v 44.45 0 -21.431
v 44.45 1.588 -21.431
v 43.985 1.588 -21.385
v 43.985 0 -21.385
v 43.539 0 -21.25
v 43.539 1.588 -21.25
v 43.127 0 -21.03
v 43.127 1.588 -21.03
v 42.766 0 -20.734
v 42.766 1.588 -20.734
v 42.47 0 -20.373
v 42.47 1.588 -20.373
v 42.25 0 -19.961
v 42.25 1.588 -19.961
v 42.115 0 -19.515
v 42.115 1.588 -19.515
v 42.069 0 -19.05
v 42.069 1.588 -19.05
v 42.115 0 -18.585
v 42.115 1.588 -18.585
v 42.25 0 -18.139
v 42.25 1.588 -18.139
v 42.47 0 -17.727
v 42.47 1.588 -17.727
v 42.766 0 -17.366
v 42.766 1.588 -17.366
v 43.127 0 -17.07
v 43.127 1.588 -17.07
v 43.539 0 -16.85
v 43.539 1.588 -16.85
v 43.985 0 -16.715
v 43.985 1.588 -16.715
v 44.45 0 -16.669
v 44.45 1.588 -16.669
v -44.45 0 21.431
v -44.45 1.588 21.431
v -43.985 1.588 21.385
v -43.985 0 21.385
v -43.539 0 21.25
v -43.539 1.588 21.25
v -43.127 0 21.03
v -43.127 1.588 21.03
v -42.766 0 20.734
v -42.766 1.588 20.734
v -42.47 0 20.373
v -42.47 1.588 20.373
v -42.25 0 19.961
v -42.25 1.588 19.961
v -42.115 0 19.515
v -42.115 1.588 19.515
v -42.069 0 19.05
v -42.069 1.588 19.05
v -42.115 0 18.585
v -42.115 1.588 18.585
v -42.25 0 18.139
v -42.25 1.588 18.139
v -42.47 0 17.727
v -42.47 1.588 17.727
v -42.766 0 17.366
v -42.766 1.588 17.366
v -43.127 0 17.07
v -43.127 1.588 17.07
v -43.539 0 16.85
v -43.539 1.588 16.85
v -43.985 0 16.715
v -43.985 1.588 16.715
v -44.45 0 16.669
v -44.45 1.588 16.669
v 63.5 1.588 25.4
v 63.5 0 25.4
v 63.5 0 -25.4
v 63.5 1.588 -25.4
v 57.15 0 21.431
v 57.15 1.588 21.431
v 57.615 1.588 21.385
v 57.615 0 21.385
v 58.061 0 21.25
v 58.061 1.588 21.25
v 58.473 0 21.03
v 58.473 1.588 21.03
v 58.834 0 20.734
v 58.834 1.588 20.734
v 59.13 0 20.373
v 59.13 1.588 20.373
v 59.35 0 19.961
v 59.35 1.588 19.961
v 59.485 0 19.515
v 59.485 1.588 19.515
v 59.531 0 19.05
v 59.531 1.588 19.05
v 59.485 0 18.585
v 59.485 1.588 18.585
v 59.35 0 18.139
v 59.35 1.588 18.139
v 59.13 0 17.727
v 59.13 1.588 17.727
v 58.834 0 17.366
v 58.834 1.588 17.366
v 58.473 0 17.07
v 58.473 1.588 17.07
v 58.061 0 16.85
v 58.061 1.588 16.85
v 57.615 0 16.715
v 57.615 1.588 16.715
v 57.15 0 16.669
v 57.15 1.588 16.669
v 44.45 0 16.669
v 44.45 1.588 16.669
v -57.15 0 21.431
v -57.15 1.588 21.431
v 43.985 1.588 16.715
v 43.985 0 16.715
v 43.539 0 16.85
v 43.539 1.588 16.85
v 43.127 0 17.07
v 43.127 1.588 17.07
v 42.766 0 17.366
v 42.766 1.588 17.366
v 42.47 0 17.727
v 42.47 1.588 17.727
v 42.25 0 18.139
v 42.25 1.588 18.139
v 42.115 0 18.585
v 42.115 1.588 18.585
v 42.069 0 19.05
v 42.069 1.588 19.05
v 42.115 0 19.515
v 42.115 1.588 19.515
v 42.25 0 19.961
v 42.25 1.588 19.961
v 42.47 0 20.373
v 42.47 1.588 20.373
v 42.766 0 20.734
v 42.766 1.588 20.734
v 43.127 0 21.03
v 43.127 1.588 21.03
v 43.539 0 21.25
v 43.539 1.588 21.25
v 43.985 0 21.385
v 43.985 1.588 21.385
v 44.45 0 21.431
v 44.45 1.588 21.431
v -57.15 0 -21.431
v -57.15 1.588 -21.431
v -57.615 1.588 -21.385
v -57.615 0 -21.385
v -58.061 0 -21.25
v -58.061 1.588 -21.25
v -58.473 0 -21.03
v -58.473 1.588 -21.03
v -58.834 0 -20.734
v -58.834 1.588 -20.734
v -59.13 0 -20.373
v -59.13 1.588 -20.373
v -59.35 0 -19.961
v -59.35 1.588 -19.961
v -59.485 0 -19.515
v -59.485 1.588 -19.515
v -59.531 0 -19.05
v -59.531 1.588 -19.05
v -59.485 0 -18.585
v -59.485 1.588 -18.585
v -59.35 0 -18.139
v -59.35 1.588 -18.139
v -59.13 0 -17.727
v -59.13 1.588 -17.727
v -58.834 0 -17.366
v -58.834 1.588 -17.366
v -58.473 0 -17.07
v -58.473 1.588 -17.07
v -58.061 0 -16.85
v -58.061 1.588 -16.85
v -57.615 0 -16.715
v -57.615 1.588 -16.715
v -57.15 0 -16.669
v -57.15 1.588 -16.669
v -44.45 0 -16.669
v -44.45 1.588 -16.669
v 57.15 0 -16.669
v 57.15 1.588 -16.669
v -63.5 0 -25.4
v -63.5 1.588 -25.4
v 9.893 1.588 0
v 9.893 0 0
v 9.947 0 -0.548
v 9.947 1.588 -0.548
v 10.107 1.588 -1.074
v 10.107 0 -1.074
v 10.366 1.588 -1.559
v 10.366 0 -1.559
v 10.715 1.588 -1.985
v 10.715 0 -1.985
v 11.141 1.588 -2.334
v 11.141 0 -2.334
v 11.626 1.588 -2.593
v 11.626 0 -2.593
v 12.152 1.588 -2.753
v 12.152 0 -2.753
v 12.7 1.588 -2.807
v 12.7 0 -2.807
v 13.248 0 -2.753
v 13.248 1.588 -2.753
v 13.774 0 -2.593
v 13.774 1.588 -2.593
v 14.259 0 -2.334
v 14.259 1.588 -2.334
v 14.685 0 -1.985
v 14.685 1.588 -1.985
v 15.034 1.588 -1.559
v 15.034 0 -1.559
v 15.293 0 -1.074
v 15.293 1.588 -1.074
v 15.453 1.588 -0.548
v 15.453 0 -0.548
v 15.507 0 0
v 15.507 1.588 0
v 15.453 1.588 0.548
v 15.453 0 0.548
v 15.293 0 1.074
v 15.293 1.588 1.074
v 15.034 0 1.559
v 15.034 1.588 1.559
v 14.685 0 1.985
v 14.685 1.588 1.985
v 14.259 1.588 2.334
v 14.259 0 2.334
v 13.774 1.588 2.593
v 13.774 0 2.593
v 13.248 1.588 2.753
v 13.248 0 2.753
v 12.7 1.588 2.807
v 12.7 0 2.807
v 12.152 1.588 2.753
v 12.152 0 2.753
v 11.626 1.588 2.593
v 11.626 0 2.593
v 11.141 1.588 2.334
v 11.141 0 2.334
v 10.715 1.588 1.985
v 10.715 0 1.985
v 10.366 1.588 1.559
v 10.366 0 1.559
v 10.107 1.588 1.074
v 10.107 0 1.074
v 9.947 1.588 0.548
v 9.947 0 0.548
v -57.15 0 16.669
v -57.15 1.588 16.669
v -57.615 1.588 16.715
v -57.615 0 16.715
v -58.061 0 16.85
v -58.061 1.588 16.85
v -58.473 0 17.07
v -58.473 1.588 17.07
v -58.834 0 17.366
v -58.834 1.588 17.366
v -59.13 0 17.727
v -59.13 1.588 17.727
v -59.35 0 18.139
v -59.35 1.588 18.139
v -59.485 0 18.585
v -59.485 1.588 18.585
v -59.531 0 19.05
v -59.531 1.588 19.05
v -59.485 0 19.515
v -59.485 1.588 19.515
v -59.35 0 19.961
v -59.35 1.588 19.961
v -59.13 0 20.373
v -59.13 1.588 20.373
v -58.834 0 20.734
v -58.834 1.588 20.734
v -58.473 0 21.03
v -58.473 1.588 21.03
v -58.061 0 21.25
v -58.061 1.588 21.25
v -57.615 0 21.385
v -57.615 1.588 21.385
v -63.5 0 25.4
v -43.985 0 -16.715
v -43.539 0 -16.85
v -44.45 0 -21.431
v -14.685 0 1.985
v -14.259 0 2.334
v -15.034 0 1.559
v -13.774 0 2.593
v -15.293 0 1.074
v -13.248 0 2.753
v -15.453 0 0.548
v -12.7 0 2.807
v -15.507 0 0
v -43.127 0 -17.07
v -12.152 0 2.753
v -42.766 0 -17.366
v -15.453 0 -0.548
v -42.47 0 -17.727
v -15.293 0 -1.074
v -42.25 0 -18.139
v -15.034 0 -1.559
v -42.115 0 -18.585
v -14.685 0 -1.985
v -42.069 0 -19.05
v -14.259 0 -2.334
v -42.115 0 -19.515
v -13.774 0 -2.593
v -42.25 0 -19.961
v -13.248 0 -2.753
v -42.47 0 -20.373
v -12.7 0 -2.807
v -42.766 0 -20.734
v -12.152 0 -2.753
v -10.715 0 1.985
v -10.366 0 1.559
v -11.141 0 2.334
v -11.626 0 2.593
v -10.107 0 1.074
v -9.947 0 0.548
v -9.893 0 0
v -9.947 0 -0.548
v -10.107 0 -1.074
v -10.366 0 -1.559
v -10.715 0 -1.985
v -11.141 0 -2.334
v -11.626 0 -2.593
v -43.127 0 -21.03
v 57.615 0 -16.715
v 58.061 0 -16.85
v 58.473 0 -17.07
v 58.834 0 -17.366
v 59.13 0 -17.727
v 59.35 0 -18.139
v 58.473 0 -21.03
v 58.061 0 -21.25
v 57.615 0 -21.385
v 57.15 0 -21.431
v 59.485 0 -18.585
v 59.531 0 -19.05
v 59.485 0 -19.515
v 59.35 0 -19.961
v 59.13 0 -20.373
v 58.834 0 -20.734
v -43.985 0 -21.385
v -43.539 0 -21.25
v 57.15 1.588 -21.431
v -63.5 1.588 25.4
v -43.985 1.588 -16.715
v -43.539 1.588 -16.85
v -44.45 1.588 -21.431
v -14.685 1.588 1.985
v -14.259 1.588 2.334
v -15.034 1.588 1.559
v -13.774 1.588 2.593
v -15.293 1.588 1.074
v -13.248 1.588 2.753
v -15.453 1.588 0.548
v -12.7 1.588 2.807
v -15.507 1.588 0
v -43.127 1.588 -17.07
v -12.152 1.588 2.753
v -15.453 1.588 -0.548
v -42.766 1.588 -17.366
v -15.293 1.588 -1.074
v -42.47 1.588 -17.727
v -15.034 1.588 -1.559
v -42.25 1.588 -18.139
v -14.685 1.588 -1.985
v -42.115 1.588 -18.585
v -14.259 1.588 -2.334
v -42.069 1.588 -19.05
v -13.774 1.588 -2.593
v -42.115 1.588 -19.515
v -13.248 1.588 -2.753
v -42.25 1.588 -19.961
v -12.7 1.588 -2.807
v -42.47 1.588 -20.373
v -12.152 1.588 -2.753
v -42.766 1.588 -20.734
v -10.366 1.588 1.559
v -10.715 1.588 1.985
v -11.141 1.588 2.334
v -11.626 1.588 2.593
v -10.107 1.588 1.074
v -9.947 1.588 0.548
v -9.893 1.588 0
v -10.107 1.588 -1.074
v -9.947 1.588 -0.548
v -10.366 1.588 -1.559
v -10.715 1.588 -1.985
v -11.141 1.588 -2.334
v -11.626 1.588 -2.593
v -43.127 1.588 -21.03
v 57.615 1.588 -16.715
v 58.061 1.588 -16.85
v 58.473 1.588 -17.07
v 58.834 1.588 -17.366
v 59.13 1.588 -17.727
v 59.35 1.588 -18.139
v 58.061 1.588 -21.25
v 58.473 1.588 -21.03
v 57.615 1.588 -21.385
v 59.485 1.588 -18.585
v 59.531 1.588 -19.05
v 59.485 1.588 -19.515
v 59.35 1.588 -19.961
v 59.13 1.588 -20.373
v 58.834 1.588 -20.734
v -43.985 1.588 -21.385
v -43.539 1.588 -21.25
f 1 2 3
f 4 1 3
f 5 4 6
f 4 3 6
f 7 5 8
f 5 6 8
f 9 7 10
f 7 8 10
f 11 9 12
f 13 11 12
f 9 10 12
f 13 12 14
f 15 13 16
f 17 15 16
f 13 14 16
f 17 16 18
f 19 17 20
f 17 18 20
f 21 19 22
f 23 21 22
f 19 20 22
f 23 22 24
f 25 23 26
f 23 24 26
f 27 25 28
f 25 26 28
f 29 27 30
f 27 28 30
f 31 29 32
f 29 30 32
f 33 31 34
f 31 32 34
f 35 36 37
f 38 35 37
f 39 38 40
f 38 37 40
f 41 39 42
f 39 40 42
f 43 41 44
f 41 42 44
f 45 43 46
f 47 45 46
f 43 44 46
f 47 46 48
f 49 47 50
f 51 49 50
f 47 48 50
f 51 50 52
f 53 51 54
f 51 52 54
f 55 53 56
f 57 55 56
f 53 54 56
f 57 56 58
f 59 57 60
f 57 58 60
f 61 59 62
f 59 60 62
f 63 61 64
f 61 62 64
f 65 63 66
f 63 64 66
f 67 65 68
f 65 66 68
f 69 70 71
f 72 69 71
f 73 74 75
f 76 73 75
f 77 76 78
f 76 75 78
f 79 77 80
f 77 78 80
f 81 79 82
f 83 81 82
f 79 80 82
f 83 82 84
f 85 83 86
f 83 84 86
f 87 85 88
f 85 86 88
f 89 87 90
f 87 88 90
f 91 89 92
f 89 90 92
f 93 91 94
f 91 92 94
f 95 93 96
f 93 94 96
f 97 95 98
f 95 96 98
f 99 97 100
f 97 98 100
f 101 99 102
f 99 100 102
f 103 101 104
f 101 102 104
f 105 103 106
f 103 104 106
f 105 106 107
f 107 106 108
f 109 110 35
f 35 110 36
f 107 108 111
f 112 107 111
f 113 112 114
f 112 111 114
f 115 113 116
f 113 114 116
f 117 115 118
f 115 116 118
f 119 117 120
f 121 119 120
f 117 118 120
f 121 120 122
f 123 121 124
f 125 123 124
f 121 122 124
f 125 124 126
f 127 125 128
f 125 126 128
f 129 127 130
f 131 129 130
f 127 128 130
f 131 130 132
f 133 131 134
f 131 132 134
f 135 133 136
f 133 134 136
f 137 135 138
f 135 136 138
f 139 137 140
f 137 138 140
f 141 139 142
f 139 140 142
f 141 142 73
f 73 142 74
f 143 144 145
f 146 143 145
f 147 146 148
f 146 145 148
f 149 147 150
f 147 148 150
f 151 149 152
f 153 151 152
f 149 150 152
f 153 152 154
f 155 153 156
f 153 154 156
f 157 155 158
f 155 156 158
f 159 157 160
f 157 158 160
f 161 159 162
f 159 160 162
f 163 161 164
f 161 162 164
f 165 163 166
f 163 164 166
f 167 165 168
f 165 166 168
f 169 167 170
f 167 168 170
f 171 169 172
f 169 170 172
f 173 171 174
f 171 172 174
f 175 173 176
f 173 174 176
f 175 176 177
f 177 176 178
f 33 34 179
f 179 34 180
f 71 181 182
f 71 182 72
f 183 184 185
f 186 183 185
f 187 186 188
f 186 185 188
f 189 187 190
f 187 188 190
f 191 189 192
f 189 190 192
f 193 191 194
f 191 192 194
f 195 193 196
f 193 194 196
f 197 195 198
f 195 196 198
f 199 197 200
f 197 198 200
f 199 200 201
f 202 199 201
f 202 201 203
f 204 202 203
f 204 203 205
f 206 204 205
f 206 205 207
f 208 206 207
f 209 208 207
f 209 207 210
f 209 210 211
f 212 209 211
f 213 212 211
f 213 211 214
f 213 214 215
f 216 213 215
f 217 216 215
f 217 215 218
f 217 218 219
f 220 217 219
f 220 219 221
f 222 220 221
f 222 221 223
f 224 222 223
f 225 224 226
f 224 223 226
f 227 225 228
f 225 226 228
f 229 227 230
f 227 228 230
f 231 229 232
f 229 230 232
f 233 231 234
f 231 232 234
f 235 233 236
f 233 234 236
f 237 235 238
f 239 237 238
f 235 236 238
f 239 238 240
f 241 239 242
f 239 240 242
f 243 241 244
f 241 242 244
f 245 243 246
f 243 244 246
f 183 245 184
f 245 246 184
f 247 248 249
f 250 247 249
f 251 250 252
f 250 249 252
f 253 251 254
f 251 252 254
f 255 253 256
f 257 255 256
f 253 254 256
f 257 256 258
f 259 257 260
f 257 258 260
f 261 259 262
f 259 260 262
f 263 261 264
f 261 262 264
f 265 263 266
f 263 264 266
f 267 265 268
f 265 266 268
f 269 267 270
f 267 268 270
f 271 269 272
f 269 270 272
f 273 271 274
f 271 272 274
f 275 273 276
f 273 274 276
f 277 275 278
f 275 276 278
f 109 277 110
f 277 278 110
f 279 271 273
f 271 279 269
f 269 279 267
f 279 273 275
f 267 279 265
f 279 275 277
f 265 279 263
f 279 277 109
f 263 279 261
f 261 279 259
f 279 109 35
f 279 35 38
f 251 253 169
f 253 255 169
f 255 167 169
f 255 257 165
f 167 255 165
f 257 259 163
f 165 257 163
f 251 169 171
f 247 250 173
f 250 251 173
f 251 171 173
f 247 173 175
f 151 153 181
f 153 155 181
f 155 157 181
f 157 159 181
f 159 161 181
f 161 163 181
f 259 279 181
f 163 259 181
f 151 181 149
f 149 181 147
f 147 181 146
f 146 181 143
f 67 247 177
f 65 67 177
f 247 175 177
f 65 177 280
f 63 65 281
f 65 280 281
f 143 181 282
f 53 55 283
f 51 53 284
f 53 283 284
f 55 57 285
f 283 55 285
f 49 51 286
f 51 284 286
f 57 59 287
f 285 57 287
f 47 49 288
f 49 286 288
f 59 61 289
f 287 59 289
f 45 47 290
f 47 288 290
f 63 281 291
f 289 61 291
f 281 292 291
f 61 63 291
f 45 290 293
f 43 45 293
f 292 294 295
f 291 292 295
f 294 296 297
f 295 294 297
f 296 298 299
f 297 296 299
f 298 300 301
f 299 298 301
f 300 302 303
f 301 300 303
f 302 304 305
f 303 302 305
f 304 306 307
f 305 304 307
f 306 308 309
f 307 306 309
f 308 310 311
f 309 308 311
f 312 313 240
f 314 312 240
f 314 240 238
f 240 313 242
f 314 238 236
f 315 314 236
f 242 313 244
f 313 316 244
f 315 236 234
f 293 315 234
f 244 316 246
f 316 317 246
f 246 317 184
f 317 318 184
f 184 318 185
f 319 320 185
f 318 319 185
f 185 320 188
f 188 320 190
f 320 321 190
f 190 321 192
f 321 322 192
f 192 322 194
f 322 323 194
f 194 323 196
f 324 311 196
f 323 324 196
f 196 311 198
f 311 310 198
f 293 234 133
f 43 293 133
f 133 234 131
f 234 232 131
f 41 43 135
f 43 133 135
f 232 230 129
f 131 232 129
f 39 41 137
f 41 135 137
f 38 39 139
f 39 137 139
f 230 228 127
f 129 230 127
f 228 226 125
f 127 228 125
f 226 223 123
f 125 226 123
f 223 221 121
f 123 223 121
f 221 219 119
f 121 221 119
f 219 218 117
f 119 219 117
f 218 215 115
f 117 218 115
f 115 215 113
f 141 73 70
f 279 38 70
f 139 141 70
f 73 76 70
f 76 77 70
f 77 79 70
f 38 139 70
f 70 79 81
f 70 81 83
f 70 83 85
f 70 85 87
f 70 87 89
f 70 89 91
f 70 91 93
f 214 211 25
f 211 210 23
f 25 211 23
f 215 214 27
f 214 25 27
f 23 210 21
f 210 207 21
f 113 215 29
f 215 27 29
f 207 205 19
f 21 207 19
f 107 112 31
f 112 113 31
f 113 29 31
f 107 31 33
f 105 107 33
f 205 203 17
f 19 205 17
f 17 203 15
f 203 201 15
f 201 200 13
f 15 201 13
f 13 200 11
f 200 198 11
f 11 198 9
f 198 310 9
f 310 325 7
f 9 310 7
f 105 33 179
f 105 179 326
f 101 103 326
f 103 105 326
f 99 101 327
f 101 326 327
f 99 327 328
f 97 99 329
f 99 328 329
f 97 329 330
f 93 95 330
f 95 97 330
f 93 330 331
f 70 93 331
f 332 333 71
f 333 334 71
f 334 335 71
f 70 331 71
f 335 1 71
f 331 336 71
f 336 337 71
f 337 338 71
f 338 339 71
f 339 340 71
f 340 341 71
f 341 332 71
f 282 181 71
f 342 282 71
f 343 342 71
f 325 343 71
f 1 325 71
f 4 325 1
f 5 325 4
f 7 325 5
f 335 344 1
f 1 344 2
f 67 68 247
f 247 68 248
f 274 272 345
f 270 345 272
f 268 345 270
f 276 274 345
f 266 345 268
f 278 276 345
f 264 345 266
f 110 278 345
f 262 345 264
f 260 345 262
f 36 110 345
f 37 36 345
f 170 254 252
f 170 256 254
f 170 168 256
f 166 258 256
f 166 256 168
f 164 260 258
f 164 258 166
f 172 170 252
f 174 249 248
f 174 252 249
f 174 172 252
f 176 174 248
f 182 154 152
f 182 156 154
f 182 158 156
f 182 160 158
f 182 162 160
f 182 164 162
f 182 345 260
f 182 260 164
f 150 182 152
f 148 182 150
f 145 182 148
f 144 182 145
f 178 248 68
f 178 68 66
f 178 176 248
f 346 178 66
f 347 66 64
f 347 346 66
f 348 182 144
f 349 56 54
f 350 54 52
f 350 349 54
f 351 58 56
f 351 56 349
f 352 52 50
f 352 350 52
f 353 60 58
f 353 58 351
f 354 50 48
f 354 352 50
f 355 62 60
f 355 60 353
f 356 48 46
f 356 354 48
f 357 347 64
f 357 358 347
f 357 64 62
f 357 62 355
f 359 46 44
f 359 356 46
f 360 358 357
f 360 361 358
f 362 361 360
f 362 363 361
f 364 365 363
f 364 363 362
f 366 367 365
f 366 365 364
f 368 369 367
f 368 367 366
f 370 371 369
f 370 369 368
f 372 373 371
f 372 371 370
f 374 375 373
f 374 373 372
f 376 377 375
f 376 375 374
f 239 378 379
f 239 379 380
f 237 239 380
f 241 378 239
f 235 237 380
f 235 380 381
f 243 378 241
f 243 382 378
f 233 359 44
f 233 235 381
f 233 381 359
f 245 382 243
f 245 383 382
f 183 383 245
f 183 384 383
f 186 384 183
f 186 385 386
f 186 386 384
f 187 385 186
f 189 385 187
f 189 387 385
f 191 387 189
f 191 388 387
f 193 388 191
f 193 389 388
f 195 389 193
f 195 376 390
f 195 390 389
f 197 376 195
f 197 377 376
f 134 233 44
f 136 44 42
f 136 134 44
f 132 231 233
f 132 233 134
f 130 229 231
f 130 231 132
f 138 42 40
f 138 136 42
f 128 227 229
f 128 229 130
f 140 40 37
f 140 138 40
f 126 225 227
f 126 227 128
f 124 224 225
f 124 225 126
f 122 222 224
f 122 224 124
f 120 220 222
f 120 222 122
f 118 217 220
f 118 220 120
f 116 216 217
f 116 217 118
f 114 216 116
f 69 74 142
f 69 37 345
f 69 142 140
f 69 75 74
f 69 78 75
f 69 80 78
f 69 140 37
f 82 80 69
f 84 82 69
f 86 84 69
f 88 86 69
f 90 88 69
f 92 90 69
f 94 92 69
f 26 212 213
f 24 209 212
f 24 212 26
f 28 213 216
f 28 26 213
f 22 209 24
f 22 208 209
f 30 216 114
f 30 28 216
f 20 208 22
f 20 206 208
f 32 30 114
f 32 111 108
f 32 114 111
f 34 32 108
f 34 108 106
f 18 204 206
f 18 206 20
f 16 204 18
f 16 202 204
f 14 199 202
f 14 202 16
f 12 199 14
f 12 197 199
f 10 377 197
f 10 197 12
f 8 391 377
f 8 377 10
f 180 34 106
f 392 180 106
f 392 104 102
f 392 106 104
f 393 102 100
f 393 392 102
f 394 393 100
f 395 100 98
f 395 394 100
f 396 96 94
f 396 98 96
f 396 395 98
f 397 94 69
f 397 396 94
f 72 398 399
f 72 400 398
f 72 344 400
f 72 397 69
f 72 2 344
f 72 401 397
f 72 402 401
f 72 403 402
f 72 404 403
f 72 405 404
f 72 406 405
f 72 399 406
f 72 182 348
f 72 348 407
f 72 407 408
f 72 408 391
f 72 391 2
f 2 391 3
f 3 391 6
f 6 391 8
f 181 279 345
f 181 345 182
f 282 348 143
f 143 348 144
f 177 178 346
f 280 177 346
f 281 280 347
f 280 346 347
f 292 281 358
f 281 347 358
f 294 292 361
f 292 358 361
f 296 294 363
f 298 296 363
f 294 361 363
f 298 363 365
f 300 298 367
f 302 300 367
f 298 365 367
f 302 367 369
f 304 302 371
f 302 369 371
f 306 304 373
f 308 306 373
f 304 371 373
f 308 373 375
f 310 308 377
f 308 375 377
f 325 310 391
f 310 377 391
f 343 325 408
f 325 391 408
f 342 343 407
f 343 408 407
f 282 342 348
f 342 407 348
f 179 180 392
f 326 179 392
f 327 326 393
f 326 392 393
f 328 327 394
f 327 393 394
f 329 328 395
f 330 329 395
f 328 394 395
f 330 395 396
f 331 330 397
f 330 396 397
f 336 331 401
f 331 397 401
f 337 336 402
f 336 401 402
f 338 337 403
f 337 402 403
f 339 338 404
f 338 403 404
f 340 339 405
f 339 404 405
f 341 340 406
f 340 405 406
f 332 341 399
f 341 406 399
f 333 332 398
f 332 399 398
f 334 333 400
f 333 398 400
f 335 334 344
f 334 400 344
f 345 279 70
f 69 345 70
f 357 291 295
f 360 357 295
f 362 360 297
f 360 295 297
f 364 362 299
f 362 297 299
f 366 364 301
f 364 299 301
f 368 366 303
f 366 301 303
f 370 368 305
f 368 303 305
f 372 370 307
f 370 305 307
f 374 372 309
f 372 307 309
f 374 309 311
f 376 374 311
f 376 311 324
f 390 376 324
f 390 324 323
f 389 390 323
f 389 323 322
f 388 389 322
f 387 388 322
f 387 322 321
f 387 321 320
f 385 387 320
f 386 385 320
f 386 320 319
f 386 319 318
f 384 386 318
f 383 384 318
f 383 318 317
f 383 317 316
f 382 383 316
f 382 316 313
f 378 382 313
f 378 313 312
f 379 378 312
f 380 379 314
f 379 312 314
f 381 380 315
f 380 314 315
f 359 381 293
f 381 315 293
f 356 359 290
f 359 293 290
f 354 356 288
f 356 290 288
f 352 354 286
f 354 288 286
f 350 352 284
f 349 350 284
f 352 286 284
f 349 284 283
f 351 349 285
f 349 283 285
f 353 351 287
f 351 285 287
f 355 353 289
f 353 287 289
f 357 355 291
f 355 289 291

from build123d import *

# Parameters (mm, degrees)
SKETCH1_W              = 127
SKETCH1_H              = 50.8
BOSS_EXTRUDE1_DEPTH    = 1.5875
SKETCH2_R              = 1.27
CUT_EXTRUDE1_DEPTH     = 69.410015029
F_10_CLEARANCE_HOLE1_D = 5.6134


with BuildPart() as part:
    # Sketch1 → Boss-Extrude1 (new body)
    with BuildSketch(Plane(origin=(0, 0, 0), x_dir=(1, 0, 0), z_dir=(0, 1, 0))):
        Rectangle(SKETCH1_W, SKETCH1_H)
    extrude(amount=BOSS_EXTRUDE1_DEPTH)

    # Sketch2 → Cut-Extrude1 (cut, through all)
    with BuildSketch(Plane(origin=(0, 1.5875, 0), x_dir=(1, 0, 0), z_dir=(0, 1, 0))):
        with Locations(Location((-12.7, 0, 0), (0, 0, 270))):
            Circle(SKETCH2_R)
        with Locations(Location((12.7, 0, 0), (0, 0, 270))):
            Circle(SKETCH2_R)
        with BuildLine():
            Line((-57.15, 16.66875), (-44.45, 16.66875))
            ThreePointArc((-44.45, 16.66875), (-42.06875, 19.05), (-44.45, 21.43125))
            Line((-44.45, 21.43125), (-57.15, 21.43125))
            ThreePointArc((-57.15, 21.43125), (-59.53125, 19.05), (-57.15, 16.66875))
        make_face()
        with BuildLine():
            Line((-57.15, -21.43125), (-44.45, -21.43125))
            ThreePointArc((-44.45, -21.43125), (-42.06875, -19.05), (-44.45, -16.66875))
            Line((-44.45, -16.66875), (-57.15, -16.66875))
            ThreePointArc((-57.15, -16.66875), (-59.53125, -19.05), (-57.15, -21.43125))
        make_face()
        with BuildLine():
            Line((44.45, 16.66875), (57.15, 16.66875))
            ThreePointArc((57.15, 16.66875), (59.53125, 19.05), (57.15, 21.43125))
            Line((57.15, 21.43125), (44.45, 21.43125))
            ThreePointArc((44.45, 21.43125), (42.06875, 19.05), (44.45, 16.66875))
        make_face()
        with BuildLine():
            Line((44.45, -21.43125), (57.15, -21.43125))
            ThreePointArc((57.15, -21.43125), (59.53125, -19.05), (57.15, -16.66875))
            Line((57.15, -16.66875), (44.45, -16.66875))
            ThreePointArc((44.45, -16.66875), (42.06875, -19.05), (44.45, -21.43125))
        make_face()
    extrude(amount=-CUT_EXTRUDE1_DEPTH, mode=Mode.SUBTRACT)

    # #10 Clearance Hole1 (through all)
    with Locations(Plane(origin=(0, 1.5875, 0), x_dir=(1, 0, 0), z_dir=(0, 1, 0))):
        with Locations((-12.7, 0), (12.7, 0)):
            Hole(F_10_CLEARANCE_HOLE1_D / 2)


solid = part.part
